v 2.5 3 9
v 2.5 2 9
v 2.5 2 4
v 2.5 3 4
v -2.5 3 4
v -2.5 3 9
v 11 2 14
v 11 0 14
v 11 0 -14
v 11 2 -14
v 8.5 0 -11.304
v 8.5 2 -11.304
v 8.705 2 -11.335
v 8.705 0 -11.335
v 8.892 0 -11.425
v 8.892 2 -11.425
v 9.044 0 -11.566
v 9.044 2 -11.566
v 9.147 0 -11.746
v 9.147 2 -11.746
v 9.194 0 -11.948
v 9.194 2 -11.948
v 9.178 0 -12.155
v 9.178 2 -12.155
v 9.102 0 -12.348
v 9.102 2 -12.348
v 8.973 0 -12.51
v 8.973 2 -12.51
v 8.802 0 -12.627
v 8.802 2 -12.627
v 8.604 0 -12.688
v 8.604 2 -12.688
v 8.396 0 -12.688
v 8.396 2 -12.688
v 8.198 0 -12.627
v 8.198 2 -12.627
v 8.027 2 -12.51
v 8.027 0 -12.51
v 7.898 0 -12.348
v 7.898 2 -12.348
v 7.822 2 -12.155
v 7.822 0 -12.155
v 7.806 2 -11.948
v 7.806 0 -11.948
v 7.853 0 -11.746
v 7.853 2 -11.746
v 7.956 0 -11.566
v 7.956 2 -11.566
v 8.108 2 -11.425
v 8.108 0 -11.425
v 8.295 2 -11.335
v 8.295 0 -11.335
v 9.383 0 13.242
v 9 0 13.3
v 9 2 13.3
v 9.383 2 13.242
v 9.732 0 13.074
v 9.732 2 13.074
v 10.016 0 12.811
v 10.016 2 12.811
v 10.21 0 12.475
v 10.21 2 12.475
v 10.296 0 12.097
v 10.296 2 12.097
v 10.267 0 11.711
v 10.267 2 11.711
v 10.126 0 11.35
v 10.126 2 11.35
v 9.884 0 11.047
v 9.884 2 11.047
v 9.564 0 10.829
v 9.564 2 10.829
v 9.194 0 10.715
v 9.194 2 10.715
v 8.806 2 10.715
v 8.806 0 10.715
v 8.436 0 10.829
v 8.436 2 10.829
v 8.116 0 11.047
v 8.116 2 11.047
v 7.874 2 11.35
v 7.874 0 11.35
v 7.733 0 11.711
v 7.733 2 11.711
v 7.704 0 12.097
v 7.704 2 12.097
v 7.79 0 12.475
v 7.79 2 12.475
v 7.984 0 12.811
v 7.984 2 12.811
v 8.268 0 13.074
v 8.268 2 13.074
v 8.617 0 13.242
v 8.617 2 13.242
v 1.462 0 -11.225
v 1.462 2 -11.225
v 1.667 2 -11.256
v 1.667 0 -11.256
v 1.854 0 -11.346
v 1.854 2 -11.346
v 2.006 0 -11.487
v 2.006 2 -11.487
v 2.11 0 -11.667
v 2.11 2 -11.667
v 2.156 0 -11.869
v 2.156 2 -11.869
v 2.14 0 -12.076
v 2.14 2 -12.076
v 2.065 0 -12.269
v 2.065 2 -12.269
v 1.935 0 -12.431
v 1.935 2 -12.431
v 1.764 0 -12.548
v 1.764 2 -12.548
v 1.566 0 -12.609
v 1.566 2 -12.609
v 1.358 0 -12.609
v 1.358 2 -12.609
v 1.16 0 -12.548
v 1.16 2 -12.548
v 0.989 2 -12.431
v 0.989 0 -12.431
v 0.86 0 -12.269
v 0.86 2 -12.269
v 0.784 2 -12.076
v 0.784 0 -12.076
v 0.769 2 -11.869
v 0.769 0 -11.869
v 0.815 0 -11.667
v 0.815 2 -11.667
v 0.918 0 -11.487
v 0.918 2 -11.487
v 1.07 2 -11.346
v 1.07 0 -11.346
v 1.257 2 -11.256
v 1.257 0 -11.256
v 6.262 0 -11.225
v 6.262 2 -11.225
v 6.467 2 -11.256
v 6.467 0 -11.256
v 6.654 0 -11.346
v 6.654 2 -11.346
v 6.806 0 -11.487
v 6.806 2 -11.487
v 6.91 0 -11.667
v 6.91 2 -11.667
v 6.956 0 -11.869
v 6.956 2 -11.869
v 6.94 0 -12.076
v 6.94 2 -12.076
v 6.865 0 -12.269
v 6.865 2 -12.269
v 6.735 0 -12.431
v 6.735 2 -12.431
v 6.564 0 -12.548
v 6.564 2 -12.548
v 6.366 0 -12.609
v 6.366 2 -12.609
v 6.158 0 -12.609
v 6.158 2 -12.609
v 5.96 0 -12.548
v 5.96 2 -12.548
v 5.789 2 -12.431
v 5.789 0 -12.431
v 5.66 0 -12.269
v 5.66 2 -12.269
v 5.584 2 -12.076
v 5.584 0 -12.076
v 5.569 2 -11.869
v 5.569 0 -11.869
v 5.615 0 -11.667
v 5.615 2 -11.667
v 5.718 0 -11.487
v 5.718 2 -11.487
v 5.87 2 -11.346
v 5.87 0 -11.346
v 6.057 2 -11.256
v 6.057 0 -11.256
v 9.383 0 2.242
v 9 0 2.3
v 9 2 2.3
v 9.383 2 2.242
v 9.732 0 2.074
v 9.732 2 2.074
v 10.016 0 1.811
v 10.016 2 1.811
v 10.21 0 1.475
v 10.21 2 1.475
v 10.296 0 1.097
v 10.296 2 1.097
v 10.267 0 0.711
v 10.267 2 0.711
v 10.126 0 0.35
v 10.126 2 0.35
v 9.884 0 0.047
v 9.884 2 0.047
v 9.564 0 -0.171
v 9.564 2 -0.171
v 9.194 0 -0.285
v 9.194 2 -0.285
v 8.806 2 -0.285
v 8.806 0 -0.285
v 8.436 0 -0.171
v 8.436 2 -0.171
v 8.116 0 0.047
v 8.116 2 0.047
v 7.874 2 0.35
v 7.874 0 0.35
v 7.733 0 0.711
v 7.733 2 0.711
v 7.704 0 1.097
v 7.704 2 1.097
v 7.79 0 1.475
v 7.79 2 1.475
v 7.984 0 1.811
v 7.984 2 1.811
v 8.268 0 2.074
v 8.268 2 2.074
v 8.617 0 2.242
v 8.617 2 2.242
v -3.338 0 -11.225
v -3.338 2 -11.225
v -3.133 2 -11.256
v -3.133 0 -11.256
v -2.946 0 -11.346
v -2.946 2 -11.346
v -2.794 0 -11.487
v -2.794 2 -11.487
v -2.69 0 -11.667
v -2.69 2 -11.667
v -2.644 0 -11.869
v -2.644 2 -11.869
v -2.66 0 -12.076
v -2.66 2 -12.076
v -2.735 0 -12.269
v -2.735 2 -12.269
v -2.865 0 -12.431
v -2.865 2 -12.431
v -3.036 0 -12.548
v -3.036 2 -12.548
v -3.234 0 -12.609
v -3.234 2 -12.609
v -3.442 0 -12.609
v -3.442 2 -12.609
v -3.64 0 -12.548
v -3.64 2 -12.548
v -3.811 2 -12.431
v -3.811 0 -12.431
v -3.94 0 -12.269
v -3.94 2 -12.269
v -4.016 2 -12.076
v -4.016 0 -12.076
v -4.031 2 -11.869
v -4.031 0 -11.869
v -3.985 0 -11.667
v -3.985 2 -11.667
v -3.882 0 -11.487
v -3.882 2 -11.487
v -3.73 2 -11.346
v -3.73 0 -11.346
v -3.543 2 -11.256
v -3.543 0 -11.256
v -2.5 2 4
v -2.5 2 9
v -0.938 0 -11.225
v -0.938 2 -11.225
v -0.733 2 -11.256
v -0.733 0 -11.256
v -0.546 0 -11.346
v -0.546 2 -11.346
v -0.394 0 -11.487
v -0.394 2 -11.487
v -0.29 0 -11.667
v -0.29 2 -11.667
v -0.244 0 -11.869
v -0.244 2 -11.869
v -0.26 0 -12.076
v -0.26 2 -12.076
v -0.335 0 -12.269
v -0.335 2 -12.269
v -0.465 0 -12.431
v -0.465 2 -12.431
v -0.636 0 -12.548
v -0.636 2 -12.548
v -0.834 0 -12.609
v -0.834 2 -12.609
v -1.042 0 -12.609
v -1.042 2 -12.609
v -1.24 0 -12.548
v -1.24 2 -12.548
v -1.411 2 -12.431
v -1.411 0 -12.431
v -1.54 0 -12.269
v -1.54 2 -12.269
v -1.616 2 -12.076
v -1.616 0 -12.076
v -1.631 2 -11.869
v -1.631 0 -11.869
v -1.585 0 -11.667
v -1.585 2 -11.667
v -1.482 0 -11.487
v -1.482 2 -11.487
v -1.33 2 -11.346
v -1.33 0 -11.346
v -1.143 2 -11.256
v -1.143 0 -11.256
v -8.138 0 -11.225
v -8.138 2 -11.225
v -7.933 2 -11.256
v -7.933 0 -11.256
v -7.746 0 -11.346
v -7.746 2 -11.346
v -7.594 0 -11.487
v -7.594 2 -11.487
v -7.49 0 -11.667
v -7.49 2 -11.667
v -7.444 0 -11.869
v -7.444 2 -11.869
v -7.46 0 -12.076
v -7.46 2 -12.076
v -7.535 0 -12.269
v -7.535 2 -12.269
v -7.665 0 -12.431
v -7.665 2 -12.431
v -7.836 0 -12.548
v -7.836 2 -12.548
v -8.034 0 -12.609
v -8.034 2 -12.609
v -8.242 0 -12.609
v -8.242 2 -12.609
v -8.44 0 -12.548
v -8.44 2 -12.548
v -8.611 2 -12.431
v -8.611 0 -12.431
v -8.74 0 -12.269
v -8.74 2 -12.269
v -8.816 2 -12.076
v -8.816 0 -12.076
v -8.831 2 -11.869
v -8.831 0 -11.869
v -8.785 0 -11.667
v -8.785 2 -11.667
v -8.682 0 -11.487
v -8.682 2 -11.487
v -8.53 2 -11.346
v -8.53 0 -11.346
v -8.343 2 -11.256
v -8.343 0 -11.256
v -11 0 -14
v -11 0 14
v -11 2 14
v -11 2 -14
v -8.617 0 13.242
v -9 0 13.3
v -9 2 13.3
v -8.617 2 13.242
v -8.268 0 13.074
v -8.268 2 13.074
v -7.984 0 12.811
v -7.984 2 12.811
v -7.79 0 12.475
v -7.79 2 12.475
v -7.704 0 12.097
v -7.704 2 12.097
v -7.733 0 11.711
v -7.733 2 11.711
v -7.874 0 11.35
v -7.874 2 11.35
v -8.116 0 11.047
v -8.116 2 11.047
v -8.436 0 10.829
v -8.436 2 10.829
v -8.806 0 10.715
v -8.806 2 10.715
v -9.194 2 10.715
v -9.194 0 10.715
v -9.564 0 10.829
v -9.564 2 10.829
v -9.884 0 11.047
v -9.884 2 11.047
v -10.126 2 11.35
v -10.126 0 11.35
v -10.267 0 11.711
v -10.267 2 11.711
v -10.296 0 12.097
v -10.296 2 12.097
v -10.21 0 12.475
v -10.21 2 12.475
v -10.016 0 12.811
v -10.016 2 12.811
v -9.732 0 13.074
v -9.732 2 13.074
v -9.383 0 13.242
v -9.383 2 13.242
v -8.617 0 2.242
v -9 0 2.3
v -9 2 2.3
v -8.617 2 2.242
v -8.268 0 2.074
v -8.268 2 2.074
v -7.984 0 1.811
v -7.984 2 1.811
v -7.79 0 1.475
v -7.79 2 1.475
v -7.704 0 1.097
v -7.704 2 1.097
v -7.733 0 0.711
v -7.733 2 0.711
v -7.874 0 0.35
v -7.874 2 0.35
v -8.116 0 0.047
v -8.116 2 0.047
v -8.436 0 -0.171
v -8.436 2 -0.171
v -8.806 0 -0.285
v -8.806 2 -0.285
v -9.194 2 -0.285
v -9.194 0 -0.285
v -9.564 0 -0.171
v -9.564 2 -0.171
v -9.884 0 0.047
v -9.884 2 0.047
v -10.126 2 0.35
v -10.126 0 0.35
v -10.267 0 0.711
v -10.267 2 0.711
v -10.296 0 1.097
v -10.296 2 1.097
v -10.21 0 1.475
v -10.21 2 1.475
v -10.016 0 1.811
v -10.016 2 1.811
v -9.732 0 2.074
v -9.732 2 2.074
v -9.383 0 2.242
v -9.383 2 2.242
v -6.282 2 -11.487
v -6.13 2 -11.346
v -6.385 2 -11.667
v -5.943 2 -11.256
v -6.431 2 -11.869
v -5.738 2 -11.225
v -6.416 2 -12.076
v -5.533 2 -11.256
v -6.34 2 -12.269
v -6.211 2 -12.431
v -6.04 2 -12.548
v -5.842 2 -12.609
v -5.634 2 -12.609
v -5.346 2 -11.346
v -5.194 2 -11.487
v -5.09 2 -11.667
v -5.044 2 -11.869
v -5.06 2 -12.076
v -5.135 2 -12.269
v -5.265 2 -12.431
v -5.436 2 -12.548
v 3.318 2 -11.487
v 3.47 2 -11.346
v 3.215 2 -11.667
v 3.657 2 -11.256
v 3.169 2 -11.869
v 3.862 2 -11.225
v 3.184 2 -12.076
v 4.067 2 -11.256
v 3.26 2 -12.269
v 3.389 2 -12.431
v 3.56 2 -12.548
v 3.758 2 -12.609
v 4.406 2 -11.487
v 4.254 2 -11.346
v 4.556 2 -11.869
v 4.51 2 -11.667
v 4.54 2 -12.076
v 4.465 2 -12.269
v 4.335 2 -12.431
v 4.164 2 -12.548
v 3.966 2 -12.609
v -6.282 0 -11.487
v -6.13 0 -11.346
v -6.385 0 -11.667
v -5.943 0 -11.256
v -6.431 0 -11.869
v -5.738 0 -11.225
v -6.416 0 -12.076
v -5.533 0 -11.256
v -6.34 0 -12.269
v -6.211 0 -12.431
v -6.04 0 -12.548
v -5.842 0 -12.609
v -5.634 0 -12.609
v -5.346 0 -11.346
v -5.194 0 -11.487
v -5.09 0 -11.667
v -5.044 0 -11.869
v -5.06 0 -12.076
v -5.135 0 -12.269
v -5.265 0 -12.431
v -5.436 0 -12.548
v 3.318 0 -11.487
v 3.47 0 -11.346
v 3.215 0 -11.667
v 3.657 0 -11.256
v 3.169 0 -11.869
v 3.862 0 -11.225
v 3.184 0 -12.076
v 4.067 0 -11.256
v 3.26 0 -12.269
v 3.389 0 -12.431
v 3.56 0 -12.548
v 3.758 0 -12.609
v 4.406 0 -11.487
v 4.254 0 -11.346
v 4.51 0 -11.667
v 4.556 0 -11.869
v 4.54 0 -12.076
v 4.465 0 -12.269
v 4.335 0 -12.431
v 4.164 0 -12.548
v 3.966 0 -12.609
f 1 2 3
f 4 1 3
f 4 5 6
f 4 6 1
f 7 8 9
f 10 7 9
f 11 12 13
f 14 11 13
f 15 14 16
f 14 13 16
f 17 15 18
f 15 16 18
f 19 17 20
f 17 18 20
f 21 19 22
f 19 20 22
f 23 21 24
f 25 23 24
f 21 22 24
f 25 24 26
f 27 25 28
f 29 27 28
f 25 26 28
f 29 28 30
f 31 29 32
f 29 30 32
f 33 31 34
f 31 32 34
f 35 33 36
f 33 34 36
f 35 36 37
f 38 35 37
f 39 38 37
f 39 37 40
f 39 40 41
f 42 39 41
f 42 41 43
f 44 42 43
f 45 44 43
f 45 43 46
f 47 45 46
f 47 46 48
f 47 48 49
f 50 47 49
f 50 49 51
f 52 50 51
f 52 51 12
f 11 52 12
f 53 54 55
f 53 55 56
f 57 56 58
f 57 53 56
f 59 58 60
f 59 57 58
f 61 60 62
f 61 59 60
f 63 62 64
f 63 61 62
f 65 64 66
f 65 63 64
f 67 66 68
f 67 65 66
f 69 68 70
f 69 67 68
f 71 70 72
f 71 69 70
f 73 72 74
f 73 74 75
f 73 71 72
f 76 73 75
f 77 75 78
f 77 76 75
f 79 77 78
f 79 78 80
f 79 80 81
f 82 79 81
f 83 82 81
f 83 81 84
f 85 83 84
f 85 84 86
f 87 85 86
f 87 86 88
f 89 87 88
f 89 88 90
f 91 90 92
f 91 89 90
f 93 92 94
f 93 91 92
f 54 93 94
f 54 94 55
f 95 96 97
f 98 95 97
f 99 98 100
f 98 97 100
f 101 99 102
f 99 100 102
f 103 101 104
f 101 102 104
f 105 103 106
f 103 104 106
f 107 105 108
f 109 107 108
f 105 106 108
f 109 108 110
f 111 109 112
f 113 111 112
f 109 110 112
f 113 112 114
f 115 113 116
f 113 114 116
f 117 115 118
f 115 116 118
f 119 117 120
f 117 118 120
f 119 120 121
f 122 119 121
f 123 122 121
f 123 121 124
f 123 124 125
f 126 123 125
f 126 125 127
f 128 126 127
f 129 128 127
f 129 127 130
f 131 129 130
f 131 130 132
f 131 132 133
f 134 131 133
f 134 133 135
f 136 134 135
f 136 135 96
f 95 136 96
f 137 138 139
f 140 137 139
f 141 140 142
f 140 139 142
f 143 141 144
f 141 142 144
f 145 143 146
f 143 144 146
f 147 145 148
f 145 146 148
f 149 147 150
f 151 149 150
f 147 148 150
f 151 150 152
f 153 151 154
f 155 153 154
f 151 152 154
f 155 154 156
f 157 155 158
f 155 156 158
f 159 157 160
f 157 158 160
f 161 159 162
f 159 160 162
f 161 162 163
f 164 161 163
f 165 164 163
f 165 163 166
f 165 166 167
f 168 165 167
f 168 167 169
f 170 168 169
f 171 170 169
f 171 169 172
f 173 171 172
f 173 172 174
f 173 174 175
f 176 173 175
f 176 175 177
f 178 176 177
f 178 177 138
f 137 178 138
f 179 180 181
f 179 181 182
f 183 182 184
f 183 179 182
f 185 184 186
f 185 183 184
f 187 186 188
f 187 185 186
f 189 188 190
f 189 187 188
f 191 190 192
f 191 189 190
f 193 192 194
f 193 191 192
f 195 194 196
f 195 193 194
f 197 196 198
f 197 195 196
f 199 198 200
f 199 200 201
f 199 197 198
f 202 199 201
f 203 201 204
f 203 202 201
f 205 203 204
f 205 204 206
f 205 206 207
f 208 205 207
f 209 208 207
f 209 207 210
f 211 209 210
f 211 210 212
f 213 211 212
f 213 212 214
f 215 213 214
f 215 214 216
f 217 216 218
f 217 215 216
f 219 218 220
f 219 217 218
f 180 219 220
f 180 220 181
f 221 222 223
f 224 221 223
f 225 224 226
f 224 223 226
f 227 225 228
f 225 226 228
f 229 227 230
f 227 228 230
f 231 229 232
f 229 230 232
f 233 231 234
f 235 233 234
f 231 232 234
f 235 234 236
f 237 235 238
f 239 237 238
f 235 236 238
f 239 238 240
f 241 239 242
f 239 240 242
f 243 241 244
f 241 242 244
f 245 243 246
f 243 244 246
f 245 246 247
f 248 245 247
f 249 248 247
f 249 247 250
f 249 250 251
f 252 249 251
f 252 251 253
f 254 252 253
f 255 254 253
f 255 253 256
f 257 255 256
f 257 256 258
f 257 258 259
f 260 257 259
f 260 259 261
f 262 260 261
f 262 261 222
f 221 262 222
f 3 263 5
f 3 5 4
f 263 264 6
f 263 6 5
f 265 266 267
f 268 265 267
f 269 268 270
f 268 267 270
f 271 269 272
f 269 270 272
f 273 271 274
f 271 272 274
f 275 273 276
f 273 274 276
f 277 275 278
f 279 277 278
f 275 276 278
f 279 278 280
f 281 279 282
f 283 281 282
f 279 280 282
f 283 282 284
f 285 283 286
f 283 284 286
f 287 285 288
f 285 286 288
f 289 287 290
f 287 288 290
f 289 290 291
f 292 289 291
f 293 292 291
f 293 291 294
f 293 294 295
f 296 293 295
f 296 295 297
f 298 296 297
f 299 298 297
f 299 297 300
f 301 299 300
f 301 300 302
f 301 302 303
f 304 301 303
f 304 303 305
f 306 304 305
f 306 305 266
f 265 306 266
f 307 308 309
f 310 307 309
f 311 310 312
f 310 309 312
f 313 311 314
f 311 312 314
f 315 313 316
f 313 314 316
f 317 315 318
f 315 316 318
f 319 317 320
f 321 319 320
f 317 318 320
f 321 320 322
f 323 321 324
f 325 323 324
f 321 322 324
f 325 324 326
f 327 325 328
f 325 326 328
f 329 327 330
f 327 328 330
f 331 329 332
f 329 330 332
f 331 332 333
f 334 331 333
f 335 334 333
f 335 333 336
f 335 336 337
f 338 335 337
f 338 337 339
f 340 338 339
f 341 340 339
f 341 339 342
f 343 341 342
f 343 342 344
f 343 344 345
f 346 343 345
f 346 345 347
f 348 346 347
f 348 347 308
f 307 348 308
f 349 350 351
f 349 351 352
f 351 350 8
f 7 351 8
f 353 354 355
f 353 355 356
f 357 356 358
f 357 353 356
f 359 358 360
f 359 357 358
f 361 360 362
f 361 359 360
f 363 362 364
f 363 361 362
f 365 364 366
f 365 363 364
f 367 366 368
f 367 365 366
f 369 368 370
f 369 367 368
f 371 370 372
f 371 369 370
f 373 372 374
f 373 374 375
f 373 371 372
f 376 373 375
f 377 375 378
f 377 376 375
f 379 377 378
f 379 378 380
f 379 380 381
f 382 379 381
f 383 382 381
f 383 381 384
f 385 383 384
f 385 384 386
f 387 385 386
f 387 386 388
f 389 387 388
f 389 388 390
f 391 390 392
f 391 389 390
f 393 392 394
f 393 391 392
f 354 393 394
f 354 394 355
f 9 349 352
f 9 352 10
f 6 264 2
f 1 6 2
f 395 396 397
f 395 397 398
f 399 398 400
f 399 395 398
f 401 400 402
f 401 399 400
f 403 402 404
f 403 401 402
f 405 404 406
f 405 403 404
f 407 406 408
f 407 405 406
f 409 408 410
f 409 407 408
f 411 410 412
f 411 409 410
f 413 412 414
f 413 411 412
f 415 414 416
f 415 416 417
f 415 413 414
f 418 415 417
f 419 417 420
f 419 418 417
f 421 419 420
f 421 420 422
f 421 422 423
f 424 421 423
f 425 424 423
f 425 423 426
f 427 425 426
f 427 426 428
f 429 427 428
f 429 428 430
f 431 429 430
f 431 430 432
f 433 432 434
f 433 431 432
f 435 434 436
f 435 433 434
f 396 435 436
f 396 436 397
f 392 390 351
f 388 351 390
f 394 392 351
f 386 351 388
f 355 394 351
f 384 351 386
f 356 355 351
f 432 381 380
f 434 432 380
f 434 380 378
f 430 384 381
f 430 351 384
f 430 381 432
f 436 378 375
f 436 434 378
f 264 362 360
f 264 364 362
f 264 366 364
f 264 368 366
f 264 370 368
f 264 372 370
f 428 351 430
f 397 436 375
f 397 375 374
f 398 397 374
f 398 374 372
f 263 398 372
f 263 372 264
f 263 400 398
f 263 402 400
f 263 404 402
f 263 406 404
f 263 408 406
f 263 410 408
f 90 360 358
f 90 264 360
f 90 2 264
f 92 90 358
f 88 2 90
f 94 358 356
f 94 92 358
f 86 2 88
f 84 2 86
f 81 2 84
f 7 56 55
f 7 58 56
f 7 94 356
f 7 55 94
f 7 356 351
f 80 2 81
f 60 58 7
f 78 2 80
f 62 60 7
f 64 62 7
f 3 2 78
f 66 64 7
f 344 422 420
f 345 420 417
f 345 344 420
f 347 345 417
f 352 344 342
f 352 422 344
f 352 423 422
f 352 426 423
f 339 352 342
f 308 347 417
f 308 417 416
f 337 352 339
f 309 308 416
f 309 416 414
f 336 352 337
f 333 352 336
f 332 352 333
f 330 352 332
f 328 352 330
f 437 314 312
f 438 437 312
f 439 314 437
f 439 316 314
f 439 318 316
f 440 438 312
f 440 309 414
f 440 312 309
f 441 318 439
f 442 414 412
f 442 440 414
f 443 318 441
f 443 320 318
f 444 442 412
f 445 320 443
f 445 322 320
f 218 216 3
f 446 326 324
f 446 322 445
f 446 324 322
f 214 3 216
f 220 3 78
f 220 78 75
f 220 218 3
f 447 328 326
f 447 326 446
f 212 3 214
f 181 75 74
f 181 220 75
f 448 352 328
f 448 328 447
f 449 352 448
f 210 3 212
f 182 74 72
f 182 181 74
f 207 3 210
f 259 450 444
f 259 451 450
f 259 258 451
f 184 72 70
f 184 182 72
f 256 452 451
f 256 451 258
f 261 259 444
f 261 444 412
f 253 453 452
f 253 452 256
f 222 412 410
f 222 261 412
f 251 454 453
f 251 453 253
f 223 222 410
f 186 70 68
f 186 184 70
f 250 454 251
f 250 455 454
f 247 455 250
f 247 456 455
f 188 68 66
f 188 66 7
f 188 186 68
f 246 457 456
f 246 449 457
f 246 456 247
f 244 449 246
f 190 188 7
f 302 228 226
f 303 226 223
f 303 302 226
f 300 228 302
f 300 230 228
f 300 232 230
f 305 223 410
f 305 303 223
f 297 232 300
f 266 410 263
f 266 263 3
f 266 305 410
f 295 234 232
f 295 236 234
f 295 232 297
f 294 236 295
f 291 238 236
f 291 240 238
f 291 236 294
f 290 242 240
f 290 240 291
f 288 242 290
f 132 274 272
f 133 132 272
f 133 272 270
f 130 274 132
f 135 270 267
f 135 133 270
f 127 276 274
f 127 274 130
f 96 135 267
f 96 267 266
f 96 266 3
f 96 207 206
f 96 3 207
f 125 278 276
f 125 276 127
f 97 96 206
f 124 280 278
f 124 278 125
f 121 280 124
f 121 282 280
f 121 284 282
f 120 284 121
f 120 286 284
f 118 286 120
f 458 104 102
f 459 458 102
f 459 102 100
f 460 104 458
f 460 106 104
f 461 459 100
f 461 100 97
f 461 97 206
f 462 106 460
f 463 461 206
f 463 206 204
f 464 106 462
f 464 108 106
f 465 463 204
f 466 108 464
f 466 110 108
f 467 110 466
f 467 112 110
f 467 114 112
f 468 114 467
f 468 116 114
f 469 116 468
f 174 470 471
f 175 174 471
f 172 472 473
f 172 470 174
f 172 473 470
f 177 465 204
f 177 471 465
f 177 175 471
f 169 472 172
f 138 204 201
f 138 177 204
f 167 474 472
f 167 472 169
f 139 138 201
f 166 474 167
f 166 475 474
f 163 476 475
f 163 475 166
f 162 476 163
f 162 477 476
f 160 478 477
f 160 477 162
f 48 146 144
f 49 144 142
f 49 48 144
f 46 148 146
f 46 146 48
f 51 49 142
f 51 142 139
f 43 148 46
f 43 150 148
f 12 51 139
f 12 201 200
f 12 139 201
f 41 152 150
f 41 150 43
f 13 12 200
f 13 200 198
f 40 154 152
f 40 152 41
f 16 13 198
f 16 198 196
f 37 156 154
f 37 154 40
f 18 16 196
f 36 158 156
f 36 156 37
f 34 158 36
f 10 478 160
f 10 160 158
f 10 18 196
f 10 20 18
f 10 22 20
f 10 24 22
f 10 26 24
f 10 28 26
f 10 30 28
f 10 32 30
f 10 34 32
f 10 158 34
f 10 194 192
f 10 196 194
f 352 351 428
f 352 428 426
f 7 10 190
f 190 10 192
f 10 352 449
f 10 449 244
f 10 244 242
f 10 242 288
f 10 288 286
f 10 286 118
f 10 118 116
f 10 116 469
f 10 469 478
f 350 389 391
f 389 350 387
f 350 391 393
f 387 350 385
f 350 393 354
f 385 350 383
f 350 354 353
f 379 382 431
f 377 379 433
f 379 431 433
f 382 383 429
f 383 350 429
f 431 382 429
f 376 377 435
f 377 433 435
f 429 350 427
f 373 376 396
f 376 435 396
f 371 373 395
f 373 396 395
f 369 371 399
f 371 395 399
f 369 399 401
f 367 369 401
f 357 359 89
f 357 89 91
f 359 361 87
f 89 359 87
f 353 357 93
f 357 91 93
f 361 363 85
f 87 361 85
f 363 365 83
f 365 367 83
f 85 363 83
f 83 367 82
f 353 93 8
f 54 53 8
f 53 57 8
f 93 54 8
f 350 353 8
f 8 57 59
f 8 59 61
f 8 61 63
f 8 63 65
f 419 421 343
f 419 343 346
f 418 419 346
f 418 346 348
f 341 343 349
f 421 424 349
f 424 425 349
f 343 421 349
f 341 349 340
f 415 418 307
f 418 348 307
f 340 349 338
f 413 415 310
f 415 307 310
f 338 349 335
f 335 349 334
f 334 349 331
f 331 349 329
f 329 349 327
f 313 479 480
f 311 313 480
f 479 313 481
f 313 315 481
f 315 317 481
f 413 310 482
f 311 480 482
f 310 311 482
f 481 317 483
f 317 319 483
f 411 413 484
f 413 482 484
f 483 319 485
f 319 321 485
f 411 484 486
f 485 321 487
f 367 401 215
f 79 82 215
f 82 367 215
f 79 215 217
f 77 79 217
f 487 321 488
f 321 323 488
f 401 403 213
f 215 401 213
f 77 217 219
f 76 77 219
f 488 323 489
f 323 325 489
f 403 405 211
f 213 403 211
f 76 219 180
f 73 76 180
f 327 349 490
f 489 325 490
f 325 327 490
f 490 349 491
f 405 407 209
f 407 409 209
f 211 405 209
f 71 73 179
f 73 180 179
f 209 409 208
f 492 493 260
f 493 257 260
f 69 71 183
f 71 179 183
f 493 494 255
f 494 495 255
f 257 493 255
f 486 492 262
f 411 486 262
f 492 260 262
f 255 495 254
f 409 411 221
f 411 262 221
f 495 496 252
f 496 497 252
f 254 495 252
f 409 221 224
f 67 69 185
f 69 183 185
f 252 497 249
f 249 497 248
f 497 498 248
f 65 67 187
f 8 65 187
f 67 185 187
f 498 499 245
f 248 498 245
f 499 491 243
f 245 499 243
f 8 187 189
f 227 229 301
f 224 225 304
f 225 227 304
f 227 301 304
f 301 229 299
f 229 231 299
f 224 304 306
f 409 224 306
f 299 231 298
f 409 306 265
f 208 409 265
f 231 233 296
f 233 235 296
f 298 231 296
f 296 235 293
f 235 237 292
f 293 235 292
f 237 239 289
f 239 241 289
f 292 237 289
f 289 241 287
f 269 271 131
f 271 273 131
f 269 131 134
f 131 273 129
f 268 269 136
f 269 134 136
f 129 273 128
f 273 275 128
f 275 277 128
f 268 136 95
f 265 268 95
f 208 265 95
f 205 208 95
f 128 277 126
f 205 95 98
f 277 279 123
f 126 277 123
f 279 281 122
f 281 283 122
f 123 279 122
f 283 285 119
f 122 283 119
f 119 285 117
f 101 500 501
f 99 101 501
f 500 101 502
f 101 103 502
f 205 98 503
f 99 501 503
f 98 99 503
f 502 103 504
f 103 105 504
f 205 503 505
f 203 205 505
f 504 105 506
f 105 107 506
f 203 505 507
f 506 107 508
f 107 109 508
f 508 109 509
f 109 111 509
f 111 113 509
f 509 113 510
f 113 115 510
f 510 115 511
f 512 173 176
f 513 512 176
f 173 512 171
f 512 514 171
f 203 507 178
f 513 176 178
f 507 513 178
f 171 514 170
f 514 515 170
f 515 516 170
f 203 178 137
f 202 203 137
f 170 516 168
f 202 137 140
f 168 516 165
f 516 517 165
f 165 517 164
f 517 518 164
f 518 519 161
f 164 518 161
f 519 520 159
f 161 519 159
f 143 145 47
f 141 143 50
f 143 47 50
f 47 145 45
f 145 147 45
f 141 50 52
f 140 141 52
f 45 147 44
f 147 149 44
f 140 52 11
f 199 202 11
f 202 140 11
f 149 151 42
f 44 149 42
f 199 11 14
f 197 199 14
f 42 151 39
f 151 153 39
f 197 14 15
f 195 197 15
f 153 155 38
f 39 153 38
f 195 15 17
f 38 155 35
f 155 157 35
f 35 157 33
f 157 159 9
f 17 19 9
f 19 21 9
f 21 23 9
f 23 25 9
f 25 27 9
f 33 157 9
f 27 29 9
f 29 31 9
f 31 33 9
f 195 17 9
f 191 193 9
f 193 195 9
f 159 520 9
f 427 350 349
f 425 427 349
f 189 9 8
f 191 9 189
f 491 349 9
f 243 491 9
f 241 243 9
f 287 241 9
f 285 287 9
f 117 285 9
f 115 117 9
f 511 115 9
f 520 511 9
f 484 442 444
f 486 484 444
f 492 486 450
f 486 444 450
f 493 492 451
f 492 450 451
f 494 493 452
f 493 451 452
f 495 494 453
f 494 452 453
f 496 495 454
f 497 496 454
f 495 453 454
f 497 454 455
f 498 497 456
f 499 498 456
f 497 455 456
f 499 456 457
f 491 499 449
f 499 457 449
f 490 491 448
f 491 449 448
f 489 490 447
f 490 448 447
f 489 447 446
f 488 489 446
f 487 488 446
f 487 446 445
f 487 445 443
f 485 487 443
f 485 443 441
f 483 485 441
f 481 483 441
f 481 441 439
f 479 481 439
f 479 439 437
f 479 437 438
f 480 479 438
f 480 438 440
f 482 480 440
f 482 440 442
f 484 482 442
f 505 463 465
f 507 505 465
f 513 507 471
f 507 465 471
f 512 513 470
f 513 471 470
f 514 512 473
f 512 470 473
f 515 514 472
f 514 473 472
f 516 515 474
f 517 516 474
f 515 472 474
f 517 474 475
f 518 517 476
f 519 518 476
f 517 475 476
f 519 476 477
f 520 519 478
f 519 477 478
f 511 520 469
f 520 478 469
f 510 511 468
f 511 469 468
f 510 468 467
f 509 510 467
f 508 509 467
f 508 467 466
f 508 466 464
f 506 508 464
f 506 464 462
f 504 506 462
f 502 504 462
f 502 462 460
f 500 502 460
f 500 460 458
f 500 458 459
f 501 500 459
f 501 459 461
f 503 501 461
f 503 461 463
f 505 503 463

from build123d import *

# Parameters (mm, degrees)
SKETCH2_W          = 22
SKETCH2_H          = 28
SKETCH2_R          = 1.3
MAINBODY_DEPTH     = 2
SKETCH3_W          = 5
SKETCH3_H          = 5
CHIP_DEPTH         = 1
SKETCH4_R          = 0.695578212
CUT_EXTRUDE1_DEPTH = 18.916472867


with BuildPart() as part:
    # Sketch2 → MainBody (new body)
    with BuildSketch(Plane(origin=(0, 0, 0), x_dir=(1, 0, 0), z_dir=(0, 1, 0))):
        Rectangle(SKETCH2_W, SKETCH2_H)
        with Locations(Location((9, -1, 0), (0, 0, 270))):
            Circle(SKETCH2_R, mode=Mode.SUBTRACT)
        with Locations(Location((-9, -1, 0), (0, 0, 270))):
            Circle(SKETCH2_R, mode=Mode.SUBTRACT)
        with Locations(Location((-9, -12, 0), (0, 0, 270))):
            Circle(SKETCH2_R, mode=Mode.SUBTRACT)
        with Locations(Location((9, -12, 0), (0, 0, 270))):
            Circle(SKETCH2_R, mode=Mode.SUBTRACT)
    extrude(amount=MAINBODY_DEPTH)

    # Sketch3 → chip (add)
    with BuildSketch(Plane(origin=(0, 2, 0), x_dir=(1, 0, 0), z_dir=(0, 1, 0))):
        with Locations((0, -6.5)):
            Rectangle(SKETCH3_W, SKETCH3_H)
    extrude(amount=CHIP_DEPTH)

    # Sketch4 → Cut-Extrude1 (cut, through all)
    with BuildSketch(Plane(origin=(0, 2, 0), x_dir=(1, 0, 0), z_dir=(0, 1, 0))):
        with Locations(Location((-8.137841022, 11.921007347, 0), (0, 0, 270))):
            Circle(SKETCH4_R)
        with Locations(Location((8.5, 12, 0), (0, 0, 270))):
            Circle(SKETCH4_R)
        with Locations(Location((-5.737841022, 11.921007347, 0), (0, 0, 270))):
            Circle(SKETCH4_R)
        with Locations(Location((-3.337841022, 11.921007347, 0), (0, 0, 270))):
            Circle(SKETCH4_R)
        with Locations(Location((-0.937841022, 11.921007347, 0), (0, 0, 270))):
            Circle(SKETCH4_R)
        with Locations(Location((1.462158978, 11.921007347, 0), (0, 0, 270))):
            Circle(SKETCH4_R)
        with Locations(Location((3.862158978, 11.921007347, 0), (0, 0, 270))):
            Circle(SKETCH4_R)
        with Locations(Location((6.262158978, 11.921007347, 0), (0, 0, 270))):
            Circle(SKETCH4_R)
    extrude(amount=-CUT_EXTRUDE1_DEPTH, mode=Mode.SUBTRACT)


solid = part.part
